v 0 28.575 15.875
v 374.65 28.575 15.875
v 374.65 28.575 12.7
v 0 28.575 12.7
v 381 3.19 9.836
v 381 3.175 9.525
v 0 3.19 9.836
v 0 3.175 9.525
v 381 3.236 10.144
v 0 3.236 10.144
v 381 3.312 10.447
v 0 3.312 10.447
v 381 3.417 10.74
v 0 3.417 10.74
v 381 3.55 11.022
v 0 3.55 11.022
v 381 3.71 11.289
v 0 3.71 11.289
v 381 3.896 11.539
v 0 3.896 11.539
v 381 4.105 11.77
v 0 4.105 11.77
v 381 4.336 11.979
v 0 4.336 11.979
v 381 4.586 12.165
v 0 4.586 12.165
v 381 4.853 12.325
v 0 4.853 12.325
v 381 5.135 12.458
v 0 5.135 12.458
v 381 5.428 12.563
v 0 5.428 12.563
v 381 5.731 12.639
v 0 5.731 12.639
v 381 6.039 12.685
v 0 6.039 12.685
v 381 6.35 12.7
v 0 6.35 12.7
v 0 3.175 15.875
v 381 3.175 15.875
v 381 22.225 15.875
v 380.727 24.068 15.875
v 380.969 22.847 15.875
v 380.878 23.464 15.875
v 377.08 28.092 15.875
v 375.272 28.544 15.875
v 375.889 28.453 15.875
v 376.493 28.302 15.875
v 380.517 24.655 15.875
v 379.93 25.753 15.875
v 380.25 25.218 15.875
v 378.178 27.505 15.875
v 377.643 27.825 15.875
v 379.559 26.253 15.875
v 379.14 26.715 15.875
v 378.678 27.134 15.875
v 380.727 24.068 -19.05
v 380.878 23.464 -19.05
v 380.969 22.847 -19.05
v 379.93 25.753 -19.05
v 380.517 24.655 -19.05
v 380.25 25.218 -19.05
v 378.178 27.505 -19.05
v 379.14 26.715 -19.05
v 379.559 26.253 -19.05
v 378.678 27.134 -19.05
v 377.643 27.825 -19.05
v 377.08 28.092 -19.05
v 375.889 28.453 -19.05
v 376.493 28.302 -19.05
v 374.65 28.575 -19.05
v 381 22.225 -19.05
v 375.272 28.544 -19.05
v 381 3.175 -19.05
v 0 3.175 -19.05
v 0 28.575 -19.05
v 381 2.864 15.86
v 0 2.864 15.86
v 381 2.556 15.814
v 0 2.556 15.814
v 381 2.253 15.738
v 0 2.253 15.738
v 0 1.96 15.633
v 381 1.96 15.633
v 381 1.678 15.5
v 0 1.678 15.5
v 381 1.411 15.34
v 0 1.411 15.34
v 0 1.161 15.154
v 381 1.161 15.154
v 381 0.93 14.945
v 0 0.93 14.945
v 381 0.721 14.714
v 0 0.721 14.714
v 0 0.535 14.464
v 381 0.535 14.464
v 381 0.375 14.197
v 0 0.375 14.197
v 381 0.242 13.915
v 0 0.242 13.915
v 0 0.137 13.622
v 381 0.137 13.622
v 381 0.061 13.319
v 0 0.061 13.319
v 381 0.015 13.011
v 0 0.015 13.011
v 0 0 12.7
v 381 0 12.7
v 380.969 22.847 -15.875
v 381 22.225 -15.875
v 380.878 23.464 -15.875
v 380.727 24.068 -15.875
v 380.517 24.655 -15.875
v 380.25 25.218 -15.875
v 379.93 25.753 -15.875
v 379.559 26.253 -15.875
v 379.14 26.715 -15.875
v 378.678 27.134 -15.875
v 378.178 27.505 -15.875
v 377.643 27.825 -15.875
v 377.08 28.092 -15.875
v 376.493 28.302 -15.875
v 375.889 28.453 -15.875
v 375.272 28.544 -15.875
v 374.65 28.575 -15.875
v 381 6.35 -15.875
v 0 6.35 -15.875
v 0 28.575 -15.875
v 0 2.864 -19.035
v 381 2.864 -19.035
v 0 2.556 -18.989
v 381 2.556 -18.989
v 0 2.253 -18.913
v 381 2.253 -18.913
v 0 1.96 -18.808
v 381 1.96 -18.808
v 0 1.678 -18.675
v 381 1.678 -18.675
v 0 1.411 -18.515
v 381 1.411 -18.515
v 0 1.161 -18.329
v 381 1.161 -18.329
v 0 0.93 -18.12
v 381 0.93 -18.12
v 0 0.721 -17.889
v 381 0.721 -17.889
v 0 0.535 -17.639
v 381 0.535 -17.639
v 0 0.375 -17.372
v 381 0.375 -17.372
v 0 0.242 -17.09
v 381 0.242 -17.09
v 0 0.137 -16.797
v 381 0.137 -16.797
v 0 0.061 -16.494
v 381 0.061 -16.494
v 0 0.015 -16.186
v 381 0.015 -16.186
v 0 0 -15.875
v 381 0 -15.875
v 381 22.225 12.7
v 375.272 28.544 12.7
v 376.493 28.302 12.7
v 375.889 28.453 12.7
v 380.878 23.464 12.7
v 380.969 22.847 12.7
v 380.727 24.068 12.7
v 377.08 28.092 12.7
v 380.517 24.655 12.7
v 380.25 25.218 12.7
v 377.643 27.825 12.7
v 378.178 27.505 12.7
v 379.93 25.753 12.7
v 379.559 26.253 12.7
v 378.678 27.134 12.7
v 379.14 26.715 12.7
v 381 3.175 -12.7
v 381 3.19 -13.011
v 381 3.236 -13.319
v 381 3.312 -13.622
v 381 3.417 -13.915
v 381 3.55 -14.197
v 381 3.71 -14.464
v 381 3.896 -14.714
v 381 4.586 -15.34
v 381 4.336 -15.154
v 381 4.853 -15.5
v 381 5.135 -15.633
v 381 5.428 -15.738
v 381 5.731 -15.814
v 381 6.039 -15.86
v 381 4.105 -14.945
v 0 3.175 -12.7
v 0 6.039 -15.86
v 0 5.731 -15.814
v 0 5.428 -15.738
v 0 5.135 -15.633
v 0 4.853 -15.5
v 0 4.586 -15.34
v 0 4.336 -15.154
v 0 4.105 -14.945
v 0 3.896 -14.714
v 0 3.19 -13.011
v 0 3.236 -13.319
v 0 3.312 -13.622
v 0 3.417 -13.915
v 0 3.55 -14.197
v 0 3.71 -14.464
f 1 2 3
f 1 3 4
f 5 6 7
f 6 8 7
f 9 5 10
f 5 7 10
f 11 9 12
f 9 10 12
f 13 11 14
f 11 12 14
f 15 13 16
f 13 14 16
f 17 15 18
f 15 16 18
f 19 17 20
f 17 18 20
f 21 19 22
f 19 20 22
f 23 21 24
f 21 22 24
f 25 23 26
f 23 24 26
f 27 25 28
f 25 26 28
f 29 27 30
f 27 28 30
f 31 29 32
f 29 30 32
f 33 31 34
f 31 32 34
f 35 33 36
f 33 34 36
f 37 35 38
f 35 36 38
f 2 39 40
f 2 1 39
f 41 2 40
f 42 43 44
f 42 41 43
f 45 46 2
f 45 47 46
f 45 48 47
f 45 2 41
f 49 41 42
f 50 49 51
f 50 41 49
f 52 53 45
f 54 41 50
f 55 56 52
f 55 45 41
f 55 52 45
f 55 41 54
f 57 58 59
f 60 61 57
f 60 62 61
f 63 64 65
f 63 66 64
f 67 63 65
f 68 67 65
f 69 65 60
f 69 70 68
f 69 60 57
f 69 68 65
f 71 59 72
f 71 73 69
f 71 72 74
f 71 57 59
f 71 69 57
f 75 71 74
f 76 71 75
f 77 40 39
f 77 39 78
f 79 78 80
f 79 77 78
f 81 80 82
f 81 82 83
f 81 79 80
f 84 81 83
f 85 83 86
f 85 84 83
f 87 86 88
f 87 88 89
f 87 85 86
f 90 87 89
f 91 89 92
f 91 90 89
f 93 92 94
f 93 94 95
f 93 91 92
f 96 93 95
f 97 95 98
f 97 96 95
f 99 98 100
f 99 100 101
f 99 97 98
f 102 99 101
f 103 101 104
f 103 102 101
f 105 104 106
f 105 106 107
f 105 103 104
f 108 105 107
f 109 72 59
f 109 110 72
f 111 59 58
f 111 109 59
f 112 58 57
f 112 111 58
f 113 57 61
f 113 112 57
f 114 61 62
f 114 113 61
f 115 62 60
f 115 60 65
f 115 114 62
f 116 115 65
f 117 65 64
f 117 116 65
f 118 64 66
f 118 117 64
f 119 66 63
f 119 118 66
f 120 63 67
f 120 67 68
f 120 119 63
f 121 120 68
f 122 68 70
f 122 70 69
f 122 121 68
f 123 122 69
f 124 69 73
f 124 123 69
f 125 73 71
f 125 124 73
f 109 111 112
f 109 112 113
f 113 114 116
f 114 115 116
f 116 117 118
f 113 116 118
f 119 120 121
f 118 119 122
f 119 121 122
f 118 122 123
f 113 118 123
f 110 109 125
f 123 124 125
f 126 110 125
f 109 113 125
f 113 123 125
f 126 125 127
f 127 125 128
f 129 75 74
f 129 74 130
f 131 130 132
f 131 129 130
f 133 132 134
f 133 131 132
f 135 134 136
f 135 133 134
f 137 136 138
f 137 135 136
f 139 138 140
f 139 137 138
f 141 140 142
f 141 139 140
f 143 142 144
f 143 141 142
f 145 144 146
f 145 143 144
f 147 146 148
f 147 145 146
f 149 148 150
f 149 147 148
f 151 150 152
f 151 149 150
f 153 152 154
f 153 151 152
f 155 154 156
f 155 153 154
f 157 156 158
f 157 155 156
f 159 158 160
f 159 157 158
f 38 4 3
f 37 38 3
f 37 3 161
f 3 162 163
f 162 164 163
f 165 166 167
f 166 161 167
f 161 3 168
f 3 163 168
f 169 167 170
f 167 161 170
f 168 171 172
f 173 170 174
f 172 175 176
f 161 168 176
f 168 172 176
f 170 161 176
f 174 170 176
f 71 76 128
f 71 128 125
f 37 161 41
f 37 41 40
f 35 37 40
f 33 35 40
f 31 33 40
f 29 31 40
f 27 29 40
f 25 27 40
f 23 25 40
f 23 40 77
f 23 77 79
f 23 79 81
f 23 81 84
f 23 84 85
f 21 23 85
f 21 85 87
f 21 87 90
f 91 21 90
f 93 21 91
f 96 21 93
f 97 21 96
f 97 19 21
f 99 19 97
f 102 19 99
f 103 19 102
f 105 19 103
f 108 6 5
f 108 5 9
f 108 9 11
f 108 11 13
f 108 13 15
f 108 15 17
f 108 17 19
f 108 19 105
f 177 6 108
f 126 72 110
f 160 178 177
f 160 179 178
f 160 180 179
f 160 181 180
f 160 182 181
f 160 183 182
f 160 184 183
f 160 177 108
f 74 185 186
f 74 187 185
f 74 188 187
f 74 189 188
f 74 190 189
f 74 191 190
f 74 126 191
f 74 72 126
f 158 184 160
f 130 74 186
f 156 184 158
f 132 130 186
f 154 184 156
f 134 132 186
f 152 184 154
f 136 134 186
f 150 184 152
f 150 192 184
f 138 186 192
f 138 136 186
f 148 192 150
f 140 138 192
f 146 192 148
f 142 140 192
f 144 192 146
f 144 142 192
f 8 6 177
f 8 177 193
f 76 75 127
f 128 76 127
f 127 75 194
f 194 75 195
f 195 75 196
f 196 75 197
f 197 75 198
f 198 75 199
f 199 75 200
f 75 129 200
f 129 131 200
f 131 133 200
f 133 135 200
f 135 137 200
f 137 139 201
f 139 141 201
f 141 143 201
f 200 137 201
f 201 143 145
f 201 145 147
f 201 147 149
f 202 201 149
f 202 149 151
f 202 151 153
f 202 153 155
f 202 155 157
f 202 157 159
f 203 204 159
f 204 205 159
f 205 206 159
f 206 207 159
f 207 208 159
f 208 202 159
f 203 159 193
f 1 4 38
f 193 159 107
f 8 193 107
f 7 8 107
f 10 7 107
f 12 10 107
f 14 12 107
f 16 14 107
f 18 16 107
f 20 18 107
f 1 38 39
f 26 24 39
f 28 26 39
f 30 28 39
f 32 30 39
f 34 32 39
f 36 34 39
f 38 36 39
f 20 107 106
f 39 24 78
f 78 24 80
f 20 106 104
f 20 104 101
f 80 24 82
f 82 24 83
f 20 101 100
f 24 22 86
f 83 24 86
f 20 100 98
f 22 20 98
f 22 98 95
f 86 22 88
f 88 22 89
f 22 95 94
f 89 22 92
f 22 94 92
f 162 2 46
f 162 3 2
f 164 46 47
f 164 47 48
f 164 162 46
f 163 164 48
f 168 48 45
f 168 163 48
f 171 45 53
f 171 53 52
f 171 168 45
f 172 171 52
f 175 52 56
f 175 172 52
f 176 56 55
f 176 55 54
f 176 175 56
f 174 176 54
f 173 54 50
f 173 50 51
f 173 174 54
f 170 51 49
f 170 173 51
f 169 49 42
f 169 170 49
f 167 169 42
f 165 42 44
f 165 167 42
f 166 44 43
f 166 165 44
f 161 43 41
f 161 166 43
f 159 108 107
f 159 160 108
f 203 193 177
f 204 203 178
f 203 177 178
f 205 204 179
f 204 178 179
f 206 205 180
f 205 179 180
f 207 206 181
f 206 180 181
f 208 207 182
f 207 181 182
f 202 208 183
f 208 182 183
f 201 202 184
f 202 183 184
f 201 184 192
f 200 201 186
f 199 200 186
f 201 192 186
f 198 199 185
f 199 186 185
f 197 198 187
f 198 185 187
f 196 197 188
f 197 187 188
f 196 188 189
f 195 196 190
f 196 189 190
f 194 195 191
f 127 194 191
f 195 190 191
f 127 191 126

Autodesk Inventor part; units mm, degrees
ref_plane "YZ Plane" through (0, 0, 0) normal (1, 0, 0) x (0, 1, 0)
ref_plane "XZ Plane" through (0, 0, 0) normal (0, 1, 0) x (-1, 0, 0)
ref_plane "XY Plane" through (0, 0, 0) normal (0, 0, 1) x (1, 0, 0)
sketch "Sketch1" plane through (0, 0, 0) normal (0, 1, 0) x (-1, 0, 0)
  point P0 (0, 0)
sketch "Sketch2" plane through (0, 0, 0) normal (0, 1, 0) x (-1, 0, 0)
  line L0 (381, 15.875) -> (-381, 15.875)
  line L1 (-381, 15.875) -> (-381, -15.875)
  line L2 (-381, -15.875) -> (381, -15.875)
  line L3 (381, -15.875) -> (381, 15.875)
  point P0 (0, 0)
  dimension "d2" = 762
  dimension "d3" = 31.75
extrude "Extrusion1" add sketch "Sketch2" along normal blind 3.175
sketch "Sketch3" plane through (381, 0, -15.875) normal (0, 0, -1) x (-1, 0, 0)
  point P0 (381, 0)
sketch "Sketch4" plane through (0, 0, 0) normal (0, -1, 0) x (1, 0, 0)
  point P0 (0, 0)
sketch "Sketch5" plane through (0, 0, 0) normal (0, -1, 0) x (1, 0, 0)
  line L0 (381, -15.875) -> (-381, -15.875)
  line L1 (-381, -15.875) -> (-381, -19.05)
  line L2 (-381, -19.05) -> (381, -19.05)
  line L3 (381, -19.05) -> (381, -15.875)
  point P0 (0, 0)
  dimension "d6" = 762
  dimension "d7" = 3.175
extrude "Extrusion2" add sketch "Sketch5" against normal blind 3.175
sketch "Sketch6" plane through (-381, 0, 15.875) normal (0, 0, 1) x (1, 0, 0)
  line L0 (0, 0) -> (762, 0)
  line L1 (762, 0) -> (762, 28.575)
  line L2 (762, 28.575) -> (0, 28.575)
  line L3 (0, 28.575) -> (0, 0)
  point P0 (381, 0)
  dimension "d10" = 762
  dimension "d11" = 28.575
sketch "Sketch7" plane through (0, 3.175, 0) normal (0, 1, 0) x (1, 0, 0)
  line L0 (-381, -15.875) -> (381, -15.875)
  line L1 (381, -15.875) -> (381, -12.7)
  line L2 (381, -12.7) -> (-381, -12.7)
  line L3 (-381, -12.7) -> (-381, -15.875)
  point P0 (0, 0)
  dimension "d12" = 762
  dimension "d13" = 3.175
extrude "Extrusion3" cut sketch "Sketch7" against normal blind 3.175
extrude "Extrusion4" add sketch "Sketch6" against normal blind 3.175
sketch "Sketch8" plane through (0, 3.175, 0) normal (0, 1, 0) x (1, 0, 0)
  point P0 (0, 0)
sketch "Sketch9" plane through (381, 0, -19.05) normal (0, 0, -1) x (-1, 0, 0)
  line L0 (0, 0) -> (762, 0)
  line L1 (762, 0) -> (762, 28.575)
  line L2 (762, 28.575) -> (0, 28.575)
  line L3 (0, 28.575) -> (0, 0)
  point P0 (381, 0)
  dimension "d18" = 762
  dimension "d19" = 28.575
sketch "Sketch10" plane through (0, 3.175, 0) normal (0, 1, 0) x (1, 0, 0)
  line L0 (381, 19.05) -> (-381, 19.05)
  line L1 (-381, 19.05) -> (-381, 15.875)
  line L2 (-381, 15.875) -> (381, 15.875)
  line L3 (381, 15.875) -> (381, 19.05)
  point P0 (0, 0)
  dimension "d20" = 762
  dimension "d21" = 3.175
extrude "Extrusion5" cut sketch "Sketch10" against normal blind 3.175
extrude "Extrusion6" add sketch "Sketch9" against normal blind 3.175
fillet "Fillet1" radius 3.175 1 edges at (0, 3.175, 12.7)
fillet "Fillet2" radius 3.175 1 edges at (0, 3.175, -15.875)
fillet "Fillet3" radius 3.175 1 edges at (0, 0, 15.875)
fillet "Fillet4" radius 3.175 1 edges at (0, 0, -19.05)
fillet "Fillet5" radius 6.35 1 edges at (-381, 28.575, -17.4625)
fillet "Fillet6" radius 6.35 1 edges at (-381, 28.575, 14.2875)
fillet "Fillet7" radius 6.35 1 edges at (381, 28.575, 14.2875)
fillet "Fillet8" radius 6.35 1 edges at (381, 28.575, -17.4625)
sketch "Sketch11" plane through (0, 3.175, 0) normal (0, 1, 0) x (1, 0, 0)
  point P0 (0, 0)
sketch "Sketch12" plane through (0, 0, 0) normal (0, -1, 0) x (1, 0, 0)
  line L0 (374.65, 15.875) -> (-374.65, 15.875) projected
  line L1 (0, 15.875) -> (-381, 15.875)
  line L2 (-381, 15.875) -> (-381, -19.05)
  line L3 (-381, -19.05) -> (0, -19.05)
  line L4 (0, -19.05) -> (0, 15.875)
  point P0 (0, 0)
extrude "Extrusion7" cut sketch "Sketch12" against normal blind 28.575
properties part number "alignmentWheelsBar"
